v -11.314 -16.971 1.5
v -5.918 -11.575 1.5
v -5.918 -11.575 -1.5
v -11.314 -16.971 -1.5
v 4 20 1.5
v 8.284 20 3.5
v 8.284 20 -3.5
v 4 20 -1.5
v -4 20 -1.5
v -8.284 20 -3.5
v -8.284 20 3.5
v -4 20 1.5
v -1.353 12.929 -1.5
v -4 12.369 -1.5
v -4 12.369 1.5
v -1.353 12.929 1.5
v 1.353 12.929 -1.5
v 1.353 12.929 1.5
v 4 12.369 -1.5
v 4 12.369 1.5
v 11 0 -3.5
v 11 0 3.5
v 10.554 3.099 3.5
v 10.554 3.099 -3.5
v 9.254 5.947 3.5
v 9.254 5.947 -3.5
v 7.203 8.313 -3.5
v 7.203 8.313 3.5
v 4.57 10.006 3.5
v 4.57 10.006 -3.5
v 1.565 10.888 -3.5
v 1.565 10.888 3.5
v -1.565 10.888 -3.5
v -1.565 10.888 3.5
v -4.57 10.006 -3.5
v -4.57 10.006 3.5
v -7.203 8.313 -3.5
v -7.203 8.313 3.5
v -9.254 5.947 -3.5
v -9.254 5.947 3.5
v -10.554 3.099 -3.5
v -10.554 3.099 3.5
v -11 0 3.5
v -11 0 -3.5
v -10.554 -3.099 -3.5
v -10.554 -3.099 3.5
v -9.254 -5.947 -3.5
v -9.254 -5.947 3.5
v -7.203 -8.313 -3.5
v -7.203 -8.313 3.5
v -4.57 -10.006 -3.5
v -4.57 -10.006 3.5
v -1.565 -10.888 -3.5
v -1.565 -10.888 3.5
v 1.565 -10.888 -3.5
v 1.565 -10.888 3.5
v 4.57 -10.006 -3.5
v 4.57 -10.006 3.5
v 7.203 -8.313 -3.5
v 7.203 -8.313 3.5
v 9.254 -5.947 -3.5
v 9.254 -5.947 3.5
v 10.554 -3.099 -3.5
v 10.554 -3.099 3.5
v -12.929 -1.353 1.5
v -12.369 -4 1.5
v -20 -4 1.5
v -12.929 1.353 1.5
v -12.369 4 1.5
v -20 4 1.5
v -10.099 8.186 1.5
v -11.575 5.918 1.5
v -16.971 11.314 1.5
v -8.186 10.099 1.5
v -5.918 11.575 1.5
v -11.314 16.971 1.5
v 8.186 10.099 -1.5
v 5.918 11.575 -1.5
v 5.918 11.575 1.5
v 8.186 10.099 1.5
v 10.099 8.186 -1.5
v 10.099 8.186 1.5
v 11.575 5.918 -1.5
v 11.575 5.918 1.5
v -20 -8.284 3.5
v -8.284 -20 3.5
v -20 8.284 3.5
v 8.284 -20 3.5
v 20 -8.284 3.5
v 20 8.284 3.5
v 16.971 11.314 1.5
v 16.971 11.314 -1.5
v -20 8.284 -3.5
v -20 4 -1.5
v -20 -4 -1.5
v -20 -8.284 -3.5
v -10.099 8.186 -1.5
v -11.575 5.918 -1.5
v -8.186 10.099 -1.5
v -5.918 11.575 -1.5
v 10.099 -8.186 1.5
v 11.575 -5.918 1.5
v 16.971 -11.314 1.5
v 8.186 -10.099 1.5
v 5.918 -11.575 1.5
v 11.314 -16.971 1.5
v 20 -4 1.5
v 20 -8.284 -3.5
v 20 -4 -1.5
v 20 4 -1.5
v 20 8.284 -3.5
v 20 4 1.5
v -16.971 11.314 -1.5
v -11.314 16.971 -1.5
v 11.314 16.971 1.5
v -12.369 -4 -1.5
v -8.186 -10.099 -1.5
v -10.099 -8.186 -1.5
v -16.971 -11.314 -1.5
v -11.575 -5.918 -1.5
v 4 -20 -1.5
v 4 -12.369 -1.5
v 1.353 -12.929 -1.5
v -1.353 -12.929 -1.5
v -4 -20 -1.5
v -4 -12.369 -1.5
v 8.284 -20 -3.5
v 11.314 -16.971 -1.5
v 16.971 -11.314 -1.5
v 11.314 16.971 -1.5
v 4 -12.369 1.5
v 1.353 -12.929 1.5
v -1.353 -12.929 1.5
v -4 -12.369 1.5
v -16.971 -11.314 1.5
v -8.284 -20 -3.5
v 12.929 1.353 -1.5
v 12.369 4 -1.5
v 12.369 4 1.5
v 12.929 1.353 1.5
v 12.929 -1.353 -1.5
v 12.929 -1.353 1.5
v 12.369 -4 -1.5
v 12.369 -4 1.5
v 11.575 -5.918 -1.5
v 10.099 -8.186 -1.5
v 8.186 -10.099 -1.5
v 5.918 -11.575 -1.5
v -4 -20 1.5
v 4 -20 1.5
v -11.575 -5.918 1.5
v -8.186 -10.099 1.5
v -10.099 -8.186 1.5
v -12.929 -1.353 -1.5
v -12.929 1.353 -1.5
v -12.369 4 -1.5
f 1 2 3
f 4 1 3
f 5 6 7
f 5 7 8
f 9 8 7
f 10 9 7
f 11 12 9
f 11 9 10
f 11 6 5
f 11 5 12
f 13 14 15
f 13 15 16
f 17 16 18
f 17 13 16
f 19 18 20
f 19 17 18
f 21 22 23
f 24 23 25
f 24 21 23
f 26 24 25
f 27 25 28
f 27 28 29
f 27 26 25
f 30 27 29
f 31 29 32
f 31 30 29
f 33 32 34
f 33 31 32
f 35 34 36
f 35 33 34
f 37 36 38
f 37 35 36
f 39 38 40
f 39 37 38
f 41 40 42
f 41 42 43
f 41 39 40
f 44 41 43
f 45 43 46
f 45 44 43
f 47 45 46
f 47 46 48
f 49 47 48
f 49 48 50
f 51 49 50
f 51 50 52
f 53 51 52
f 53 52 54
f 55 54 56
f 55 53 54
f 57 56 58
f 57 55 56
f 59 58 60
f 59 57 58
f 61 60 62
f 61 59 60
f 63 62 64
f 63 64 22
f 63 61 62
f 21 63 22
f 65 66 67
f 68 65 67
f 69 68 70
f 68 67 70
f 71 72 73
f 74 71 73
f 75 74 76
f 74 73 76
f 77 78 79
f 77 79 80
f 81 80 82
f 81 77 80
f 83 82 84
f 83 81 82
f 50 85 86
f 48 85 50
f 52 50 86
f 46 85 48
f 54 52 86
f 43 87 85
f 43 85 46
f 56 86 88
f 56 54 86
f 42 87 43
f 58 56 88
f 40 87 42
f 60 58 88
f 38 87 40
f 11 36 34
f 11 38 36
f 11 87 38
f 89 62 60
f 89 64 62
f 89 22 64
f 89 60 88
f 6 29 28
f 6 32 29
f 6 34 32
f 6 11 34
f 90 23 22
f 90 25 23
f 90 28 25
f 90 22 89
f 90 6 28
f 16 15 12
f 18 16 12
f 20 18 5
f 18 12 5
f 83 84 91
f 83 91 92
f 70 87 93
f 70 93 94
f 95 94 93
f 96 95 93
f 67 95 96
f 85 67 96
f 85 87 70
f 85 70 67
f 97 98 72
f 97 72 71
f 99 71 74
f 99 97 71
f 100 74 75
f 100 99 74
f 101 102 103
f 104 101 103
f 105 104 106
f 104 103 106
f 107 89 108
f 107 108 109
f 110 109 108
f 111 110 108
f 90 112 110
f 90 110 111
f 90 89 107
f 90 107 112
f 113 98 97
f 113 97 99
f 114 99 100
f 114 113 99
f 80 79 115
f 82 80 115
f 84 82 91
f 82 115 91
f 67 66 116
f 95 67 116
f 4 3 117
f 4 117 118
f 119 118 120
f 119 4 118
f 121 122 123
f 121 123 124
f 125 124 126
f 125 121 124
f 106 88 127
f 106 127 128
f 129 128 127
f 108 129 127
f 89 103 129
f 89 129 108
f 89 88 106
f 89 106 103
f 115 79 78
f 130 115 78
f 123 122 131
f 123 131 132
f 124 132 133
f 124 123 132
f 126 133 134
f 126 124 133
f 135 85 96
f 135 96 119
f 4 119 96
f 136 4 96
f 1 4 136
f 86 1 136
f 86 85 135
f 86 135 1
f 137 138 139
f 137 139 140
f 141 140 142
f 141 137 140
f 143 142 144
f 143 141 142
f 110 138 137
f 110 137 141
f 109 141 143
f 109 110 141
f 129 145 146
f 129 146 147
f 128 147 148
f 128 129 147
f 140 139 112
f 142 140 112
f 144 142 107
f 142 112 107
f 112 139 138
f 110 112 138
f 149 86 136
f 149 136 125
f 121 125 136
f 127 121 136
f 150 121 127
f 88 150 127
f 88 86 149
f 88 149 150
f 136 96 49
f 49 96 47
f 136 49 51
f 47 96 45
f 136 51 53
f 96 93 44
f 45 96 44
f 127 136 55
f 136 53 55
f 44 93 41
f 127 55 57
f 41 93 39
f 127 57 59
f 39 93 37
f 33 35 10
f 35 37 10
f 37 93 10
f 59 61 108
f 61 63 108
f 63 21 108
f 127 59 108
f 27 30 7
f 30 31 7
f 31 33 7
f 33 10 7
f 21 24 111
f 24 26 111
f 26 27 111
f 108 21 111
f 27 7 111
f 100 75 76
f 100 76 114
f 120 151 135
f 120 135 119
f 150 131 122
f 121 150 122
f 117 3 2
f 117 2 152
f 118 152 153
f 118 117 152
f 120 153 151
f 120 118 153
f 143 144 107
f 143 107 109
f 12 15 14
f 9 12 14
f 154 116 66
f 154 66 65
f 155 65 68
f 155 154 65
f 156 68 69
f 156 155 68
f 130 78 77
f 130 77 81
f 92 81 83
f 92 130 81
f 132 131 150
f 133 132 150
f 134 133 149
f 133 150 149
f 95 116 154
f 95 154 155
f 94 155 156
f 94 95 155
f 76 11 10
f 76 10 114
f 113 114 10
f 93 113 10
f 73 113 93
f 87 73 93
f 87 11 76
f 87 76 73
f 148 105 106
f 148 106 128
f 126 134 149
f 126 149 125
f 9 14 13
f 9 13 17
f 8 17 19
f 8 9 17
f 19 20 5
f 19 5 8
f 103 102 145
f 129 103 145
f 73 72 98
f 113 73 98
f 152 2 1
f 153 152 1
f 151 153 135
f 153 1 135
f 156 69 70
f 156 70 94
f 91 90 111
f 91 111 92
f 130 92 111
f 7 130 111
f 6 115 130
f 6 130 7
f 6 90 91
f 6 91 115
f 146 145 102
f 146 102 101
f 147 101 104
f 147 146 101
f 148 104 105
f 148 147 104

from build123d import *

# Parameters (mm, degrees)
SKETCH1_R               = 11
BOSS_EXTRUDE1_DEPTH     = 3.5
CUT_EXTRUDE3_REACH      = 46.858
CUT_EXTRUDE3_END_RADIUS = 13
SKETCH2_W               = 8
SKETCH2_H               = 3
CIRPATTERN1_COUNT       = 8


with BuildPart() as part:
    # Sketch1 → Boss-Extrude1 (new, symmetric)
    with BuildSketch(Plane.XY):
        Polygon((8.284271247, 20), (-8.284271247, 20), (-20, 8.284271247), (-20, -8.284271247), (-8.284271247, -20), (8.284271247, -20), (20, -8.284271247), (20, 8.284271247), align=None)
        Circle(SKETCH1_R, mode=Mode.SUBTRACT)
    extrude(amount=BOSS_EXTRUDE1_DEPTH, both=True)

    # Cut-Extrude3: up to this cylinder (the profile starts outside it)
    cut_extrude3_end = Plane(origin=(0, 0, 0), z_dir=(0, 0, -1)) * Cylinder(CUT_EXTRUDE3_END_RADIUS, 120.716, mode=Mode.PRIVATE)
    # Sketch2 → Cut-Extrude3 (cut, up to the surface)
    with BuildSketch(Plane(origin=(0, -20, 0), x_dir=(-1, 0, 0), z_dir=(0, -1, 0)), mode=Mode.PRIVATE) as cut_extrude3_sk1:
        Rectangle(SKETCH2_W, SKETCH2_H)
    cut_extrude3_tool1 = extrude(cut_extrude3_sk1.sketch, amount=-CUT_EXTRUDE3_REACH, mode=Mode.PRIVATE) - cut_extrude3_end
    cut_extrude3 = cut_extrude3_tool1.solids().sort_by_distance((0, -20, 0))[0]
    add(cut_extrude3, mode=Mode.SUBTRACT)

    # CirPattern1: Cut-Extrude3 ×8 about axis
    cirpattern1_axis = Axis((0, 0, 0), (0, 0, 1))
    for i in range(1, CIRPATTERN1_COUNT):
        add(cut_extrude3.rotate(cirpattern1_axis, i * 360 / CIRPATTERN1_COUNT), mode=Mode.SUBTRACT)


solid = part.part
